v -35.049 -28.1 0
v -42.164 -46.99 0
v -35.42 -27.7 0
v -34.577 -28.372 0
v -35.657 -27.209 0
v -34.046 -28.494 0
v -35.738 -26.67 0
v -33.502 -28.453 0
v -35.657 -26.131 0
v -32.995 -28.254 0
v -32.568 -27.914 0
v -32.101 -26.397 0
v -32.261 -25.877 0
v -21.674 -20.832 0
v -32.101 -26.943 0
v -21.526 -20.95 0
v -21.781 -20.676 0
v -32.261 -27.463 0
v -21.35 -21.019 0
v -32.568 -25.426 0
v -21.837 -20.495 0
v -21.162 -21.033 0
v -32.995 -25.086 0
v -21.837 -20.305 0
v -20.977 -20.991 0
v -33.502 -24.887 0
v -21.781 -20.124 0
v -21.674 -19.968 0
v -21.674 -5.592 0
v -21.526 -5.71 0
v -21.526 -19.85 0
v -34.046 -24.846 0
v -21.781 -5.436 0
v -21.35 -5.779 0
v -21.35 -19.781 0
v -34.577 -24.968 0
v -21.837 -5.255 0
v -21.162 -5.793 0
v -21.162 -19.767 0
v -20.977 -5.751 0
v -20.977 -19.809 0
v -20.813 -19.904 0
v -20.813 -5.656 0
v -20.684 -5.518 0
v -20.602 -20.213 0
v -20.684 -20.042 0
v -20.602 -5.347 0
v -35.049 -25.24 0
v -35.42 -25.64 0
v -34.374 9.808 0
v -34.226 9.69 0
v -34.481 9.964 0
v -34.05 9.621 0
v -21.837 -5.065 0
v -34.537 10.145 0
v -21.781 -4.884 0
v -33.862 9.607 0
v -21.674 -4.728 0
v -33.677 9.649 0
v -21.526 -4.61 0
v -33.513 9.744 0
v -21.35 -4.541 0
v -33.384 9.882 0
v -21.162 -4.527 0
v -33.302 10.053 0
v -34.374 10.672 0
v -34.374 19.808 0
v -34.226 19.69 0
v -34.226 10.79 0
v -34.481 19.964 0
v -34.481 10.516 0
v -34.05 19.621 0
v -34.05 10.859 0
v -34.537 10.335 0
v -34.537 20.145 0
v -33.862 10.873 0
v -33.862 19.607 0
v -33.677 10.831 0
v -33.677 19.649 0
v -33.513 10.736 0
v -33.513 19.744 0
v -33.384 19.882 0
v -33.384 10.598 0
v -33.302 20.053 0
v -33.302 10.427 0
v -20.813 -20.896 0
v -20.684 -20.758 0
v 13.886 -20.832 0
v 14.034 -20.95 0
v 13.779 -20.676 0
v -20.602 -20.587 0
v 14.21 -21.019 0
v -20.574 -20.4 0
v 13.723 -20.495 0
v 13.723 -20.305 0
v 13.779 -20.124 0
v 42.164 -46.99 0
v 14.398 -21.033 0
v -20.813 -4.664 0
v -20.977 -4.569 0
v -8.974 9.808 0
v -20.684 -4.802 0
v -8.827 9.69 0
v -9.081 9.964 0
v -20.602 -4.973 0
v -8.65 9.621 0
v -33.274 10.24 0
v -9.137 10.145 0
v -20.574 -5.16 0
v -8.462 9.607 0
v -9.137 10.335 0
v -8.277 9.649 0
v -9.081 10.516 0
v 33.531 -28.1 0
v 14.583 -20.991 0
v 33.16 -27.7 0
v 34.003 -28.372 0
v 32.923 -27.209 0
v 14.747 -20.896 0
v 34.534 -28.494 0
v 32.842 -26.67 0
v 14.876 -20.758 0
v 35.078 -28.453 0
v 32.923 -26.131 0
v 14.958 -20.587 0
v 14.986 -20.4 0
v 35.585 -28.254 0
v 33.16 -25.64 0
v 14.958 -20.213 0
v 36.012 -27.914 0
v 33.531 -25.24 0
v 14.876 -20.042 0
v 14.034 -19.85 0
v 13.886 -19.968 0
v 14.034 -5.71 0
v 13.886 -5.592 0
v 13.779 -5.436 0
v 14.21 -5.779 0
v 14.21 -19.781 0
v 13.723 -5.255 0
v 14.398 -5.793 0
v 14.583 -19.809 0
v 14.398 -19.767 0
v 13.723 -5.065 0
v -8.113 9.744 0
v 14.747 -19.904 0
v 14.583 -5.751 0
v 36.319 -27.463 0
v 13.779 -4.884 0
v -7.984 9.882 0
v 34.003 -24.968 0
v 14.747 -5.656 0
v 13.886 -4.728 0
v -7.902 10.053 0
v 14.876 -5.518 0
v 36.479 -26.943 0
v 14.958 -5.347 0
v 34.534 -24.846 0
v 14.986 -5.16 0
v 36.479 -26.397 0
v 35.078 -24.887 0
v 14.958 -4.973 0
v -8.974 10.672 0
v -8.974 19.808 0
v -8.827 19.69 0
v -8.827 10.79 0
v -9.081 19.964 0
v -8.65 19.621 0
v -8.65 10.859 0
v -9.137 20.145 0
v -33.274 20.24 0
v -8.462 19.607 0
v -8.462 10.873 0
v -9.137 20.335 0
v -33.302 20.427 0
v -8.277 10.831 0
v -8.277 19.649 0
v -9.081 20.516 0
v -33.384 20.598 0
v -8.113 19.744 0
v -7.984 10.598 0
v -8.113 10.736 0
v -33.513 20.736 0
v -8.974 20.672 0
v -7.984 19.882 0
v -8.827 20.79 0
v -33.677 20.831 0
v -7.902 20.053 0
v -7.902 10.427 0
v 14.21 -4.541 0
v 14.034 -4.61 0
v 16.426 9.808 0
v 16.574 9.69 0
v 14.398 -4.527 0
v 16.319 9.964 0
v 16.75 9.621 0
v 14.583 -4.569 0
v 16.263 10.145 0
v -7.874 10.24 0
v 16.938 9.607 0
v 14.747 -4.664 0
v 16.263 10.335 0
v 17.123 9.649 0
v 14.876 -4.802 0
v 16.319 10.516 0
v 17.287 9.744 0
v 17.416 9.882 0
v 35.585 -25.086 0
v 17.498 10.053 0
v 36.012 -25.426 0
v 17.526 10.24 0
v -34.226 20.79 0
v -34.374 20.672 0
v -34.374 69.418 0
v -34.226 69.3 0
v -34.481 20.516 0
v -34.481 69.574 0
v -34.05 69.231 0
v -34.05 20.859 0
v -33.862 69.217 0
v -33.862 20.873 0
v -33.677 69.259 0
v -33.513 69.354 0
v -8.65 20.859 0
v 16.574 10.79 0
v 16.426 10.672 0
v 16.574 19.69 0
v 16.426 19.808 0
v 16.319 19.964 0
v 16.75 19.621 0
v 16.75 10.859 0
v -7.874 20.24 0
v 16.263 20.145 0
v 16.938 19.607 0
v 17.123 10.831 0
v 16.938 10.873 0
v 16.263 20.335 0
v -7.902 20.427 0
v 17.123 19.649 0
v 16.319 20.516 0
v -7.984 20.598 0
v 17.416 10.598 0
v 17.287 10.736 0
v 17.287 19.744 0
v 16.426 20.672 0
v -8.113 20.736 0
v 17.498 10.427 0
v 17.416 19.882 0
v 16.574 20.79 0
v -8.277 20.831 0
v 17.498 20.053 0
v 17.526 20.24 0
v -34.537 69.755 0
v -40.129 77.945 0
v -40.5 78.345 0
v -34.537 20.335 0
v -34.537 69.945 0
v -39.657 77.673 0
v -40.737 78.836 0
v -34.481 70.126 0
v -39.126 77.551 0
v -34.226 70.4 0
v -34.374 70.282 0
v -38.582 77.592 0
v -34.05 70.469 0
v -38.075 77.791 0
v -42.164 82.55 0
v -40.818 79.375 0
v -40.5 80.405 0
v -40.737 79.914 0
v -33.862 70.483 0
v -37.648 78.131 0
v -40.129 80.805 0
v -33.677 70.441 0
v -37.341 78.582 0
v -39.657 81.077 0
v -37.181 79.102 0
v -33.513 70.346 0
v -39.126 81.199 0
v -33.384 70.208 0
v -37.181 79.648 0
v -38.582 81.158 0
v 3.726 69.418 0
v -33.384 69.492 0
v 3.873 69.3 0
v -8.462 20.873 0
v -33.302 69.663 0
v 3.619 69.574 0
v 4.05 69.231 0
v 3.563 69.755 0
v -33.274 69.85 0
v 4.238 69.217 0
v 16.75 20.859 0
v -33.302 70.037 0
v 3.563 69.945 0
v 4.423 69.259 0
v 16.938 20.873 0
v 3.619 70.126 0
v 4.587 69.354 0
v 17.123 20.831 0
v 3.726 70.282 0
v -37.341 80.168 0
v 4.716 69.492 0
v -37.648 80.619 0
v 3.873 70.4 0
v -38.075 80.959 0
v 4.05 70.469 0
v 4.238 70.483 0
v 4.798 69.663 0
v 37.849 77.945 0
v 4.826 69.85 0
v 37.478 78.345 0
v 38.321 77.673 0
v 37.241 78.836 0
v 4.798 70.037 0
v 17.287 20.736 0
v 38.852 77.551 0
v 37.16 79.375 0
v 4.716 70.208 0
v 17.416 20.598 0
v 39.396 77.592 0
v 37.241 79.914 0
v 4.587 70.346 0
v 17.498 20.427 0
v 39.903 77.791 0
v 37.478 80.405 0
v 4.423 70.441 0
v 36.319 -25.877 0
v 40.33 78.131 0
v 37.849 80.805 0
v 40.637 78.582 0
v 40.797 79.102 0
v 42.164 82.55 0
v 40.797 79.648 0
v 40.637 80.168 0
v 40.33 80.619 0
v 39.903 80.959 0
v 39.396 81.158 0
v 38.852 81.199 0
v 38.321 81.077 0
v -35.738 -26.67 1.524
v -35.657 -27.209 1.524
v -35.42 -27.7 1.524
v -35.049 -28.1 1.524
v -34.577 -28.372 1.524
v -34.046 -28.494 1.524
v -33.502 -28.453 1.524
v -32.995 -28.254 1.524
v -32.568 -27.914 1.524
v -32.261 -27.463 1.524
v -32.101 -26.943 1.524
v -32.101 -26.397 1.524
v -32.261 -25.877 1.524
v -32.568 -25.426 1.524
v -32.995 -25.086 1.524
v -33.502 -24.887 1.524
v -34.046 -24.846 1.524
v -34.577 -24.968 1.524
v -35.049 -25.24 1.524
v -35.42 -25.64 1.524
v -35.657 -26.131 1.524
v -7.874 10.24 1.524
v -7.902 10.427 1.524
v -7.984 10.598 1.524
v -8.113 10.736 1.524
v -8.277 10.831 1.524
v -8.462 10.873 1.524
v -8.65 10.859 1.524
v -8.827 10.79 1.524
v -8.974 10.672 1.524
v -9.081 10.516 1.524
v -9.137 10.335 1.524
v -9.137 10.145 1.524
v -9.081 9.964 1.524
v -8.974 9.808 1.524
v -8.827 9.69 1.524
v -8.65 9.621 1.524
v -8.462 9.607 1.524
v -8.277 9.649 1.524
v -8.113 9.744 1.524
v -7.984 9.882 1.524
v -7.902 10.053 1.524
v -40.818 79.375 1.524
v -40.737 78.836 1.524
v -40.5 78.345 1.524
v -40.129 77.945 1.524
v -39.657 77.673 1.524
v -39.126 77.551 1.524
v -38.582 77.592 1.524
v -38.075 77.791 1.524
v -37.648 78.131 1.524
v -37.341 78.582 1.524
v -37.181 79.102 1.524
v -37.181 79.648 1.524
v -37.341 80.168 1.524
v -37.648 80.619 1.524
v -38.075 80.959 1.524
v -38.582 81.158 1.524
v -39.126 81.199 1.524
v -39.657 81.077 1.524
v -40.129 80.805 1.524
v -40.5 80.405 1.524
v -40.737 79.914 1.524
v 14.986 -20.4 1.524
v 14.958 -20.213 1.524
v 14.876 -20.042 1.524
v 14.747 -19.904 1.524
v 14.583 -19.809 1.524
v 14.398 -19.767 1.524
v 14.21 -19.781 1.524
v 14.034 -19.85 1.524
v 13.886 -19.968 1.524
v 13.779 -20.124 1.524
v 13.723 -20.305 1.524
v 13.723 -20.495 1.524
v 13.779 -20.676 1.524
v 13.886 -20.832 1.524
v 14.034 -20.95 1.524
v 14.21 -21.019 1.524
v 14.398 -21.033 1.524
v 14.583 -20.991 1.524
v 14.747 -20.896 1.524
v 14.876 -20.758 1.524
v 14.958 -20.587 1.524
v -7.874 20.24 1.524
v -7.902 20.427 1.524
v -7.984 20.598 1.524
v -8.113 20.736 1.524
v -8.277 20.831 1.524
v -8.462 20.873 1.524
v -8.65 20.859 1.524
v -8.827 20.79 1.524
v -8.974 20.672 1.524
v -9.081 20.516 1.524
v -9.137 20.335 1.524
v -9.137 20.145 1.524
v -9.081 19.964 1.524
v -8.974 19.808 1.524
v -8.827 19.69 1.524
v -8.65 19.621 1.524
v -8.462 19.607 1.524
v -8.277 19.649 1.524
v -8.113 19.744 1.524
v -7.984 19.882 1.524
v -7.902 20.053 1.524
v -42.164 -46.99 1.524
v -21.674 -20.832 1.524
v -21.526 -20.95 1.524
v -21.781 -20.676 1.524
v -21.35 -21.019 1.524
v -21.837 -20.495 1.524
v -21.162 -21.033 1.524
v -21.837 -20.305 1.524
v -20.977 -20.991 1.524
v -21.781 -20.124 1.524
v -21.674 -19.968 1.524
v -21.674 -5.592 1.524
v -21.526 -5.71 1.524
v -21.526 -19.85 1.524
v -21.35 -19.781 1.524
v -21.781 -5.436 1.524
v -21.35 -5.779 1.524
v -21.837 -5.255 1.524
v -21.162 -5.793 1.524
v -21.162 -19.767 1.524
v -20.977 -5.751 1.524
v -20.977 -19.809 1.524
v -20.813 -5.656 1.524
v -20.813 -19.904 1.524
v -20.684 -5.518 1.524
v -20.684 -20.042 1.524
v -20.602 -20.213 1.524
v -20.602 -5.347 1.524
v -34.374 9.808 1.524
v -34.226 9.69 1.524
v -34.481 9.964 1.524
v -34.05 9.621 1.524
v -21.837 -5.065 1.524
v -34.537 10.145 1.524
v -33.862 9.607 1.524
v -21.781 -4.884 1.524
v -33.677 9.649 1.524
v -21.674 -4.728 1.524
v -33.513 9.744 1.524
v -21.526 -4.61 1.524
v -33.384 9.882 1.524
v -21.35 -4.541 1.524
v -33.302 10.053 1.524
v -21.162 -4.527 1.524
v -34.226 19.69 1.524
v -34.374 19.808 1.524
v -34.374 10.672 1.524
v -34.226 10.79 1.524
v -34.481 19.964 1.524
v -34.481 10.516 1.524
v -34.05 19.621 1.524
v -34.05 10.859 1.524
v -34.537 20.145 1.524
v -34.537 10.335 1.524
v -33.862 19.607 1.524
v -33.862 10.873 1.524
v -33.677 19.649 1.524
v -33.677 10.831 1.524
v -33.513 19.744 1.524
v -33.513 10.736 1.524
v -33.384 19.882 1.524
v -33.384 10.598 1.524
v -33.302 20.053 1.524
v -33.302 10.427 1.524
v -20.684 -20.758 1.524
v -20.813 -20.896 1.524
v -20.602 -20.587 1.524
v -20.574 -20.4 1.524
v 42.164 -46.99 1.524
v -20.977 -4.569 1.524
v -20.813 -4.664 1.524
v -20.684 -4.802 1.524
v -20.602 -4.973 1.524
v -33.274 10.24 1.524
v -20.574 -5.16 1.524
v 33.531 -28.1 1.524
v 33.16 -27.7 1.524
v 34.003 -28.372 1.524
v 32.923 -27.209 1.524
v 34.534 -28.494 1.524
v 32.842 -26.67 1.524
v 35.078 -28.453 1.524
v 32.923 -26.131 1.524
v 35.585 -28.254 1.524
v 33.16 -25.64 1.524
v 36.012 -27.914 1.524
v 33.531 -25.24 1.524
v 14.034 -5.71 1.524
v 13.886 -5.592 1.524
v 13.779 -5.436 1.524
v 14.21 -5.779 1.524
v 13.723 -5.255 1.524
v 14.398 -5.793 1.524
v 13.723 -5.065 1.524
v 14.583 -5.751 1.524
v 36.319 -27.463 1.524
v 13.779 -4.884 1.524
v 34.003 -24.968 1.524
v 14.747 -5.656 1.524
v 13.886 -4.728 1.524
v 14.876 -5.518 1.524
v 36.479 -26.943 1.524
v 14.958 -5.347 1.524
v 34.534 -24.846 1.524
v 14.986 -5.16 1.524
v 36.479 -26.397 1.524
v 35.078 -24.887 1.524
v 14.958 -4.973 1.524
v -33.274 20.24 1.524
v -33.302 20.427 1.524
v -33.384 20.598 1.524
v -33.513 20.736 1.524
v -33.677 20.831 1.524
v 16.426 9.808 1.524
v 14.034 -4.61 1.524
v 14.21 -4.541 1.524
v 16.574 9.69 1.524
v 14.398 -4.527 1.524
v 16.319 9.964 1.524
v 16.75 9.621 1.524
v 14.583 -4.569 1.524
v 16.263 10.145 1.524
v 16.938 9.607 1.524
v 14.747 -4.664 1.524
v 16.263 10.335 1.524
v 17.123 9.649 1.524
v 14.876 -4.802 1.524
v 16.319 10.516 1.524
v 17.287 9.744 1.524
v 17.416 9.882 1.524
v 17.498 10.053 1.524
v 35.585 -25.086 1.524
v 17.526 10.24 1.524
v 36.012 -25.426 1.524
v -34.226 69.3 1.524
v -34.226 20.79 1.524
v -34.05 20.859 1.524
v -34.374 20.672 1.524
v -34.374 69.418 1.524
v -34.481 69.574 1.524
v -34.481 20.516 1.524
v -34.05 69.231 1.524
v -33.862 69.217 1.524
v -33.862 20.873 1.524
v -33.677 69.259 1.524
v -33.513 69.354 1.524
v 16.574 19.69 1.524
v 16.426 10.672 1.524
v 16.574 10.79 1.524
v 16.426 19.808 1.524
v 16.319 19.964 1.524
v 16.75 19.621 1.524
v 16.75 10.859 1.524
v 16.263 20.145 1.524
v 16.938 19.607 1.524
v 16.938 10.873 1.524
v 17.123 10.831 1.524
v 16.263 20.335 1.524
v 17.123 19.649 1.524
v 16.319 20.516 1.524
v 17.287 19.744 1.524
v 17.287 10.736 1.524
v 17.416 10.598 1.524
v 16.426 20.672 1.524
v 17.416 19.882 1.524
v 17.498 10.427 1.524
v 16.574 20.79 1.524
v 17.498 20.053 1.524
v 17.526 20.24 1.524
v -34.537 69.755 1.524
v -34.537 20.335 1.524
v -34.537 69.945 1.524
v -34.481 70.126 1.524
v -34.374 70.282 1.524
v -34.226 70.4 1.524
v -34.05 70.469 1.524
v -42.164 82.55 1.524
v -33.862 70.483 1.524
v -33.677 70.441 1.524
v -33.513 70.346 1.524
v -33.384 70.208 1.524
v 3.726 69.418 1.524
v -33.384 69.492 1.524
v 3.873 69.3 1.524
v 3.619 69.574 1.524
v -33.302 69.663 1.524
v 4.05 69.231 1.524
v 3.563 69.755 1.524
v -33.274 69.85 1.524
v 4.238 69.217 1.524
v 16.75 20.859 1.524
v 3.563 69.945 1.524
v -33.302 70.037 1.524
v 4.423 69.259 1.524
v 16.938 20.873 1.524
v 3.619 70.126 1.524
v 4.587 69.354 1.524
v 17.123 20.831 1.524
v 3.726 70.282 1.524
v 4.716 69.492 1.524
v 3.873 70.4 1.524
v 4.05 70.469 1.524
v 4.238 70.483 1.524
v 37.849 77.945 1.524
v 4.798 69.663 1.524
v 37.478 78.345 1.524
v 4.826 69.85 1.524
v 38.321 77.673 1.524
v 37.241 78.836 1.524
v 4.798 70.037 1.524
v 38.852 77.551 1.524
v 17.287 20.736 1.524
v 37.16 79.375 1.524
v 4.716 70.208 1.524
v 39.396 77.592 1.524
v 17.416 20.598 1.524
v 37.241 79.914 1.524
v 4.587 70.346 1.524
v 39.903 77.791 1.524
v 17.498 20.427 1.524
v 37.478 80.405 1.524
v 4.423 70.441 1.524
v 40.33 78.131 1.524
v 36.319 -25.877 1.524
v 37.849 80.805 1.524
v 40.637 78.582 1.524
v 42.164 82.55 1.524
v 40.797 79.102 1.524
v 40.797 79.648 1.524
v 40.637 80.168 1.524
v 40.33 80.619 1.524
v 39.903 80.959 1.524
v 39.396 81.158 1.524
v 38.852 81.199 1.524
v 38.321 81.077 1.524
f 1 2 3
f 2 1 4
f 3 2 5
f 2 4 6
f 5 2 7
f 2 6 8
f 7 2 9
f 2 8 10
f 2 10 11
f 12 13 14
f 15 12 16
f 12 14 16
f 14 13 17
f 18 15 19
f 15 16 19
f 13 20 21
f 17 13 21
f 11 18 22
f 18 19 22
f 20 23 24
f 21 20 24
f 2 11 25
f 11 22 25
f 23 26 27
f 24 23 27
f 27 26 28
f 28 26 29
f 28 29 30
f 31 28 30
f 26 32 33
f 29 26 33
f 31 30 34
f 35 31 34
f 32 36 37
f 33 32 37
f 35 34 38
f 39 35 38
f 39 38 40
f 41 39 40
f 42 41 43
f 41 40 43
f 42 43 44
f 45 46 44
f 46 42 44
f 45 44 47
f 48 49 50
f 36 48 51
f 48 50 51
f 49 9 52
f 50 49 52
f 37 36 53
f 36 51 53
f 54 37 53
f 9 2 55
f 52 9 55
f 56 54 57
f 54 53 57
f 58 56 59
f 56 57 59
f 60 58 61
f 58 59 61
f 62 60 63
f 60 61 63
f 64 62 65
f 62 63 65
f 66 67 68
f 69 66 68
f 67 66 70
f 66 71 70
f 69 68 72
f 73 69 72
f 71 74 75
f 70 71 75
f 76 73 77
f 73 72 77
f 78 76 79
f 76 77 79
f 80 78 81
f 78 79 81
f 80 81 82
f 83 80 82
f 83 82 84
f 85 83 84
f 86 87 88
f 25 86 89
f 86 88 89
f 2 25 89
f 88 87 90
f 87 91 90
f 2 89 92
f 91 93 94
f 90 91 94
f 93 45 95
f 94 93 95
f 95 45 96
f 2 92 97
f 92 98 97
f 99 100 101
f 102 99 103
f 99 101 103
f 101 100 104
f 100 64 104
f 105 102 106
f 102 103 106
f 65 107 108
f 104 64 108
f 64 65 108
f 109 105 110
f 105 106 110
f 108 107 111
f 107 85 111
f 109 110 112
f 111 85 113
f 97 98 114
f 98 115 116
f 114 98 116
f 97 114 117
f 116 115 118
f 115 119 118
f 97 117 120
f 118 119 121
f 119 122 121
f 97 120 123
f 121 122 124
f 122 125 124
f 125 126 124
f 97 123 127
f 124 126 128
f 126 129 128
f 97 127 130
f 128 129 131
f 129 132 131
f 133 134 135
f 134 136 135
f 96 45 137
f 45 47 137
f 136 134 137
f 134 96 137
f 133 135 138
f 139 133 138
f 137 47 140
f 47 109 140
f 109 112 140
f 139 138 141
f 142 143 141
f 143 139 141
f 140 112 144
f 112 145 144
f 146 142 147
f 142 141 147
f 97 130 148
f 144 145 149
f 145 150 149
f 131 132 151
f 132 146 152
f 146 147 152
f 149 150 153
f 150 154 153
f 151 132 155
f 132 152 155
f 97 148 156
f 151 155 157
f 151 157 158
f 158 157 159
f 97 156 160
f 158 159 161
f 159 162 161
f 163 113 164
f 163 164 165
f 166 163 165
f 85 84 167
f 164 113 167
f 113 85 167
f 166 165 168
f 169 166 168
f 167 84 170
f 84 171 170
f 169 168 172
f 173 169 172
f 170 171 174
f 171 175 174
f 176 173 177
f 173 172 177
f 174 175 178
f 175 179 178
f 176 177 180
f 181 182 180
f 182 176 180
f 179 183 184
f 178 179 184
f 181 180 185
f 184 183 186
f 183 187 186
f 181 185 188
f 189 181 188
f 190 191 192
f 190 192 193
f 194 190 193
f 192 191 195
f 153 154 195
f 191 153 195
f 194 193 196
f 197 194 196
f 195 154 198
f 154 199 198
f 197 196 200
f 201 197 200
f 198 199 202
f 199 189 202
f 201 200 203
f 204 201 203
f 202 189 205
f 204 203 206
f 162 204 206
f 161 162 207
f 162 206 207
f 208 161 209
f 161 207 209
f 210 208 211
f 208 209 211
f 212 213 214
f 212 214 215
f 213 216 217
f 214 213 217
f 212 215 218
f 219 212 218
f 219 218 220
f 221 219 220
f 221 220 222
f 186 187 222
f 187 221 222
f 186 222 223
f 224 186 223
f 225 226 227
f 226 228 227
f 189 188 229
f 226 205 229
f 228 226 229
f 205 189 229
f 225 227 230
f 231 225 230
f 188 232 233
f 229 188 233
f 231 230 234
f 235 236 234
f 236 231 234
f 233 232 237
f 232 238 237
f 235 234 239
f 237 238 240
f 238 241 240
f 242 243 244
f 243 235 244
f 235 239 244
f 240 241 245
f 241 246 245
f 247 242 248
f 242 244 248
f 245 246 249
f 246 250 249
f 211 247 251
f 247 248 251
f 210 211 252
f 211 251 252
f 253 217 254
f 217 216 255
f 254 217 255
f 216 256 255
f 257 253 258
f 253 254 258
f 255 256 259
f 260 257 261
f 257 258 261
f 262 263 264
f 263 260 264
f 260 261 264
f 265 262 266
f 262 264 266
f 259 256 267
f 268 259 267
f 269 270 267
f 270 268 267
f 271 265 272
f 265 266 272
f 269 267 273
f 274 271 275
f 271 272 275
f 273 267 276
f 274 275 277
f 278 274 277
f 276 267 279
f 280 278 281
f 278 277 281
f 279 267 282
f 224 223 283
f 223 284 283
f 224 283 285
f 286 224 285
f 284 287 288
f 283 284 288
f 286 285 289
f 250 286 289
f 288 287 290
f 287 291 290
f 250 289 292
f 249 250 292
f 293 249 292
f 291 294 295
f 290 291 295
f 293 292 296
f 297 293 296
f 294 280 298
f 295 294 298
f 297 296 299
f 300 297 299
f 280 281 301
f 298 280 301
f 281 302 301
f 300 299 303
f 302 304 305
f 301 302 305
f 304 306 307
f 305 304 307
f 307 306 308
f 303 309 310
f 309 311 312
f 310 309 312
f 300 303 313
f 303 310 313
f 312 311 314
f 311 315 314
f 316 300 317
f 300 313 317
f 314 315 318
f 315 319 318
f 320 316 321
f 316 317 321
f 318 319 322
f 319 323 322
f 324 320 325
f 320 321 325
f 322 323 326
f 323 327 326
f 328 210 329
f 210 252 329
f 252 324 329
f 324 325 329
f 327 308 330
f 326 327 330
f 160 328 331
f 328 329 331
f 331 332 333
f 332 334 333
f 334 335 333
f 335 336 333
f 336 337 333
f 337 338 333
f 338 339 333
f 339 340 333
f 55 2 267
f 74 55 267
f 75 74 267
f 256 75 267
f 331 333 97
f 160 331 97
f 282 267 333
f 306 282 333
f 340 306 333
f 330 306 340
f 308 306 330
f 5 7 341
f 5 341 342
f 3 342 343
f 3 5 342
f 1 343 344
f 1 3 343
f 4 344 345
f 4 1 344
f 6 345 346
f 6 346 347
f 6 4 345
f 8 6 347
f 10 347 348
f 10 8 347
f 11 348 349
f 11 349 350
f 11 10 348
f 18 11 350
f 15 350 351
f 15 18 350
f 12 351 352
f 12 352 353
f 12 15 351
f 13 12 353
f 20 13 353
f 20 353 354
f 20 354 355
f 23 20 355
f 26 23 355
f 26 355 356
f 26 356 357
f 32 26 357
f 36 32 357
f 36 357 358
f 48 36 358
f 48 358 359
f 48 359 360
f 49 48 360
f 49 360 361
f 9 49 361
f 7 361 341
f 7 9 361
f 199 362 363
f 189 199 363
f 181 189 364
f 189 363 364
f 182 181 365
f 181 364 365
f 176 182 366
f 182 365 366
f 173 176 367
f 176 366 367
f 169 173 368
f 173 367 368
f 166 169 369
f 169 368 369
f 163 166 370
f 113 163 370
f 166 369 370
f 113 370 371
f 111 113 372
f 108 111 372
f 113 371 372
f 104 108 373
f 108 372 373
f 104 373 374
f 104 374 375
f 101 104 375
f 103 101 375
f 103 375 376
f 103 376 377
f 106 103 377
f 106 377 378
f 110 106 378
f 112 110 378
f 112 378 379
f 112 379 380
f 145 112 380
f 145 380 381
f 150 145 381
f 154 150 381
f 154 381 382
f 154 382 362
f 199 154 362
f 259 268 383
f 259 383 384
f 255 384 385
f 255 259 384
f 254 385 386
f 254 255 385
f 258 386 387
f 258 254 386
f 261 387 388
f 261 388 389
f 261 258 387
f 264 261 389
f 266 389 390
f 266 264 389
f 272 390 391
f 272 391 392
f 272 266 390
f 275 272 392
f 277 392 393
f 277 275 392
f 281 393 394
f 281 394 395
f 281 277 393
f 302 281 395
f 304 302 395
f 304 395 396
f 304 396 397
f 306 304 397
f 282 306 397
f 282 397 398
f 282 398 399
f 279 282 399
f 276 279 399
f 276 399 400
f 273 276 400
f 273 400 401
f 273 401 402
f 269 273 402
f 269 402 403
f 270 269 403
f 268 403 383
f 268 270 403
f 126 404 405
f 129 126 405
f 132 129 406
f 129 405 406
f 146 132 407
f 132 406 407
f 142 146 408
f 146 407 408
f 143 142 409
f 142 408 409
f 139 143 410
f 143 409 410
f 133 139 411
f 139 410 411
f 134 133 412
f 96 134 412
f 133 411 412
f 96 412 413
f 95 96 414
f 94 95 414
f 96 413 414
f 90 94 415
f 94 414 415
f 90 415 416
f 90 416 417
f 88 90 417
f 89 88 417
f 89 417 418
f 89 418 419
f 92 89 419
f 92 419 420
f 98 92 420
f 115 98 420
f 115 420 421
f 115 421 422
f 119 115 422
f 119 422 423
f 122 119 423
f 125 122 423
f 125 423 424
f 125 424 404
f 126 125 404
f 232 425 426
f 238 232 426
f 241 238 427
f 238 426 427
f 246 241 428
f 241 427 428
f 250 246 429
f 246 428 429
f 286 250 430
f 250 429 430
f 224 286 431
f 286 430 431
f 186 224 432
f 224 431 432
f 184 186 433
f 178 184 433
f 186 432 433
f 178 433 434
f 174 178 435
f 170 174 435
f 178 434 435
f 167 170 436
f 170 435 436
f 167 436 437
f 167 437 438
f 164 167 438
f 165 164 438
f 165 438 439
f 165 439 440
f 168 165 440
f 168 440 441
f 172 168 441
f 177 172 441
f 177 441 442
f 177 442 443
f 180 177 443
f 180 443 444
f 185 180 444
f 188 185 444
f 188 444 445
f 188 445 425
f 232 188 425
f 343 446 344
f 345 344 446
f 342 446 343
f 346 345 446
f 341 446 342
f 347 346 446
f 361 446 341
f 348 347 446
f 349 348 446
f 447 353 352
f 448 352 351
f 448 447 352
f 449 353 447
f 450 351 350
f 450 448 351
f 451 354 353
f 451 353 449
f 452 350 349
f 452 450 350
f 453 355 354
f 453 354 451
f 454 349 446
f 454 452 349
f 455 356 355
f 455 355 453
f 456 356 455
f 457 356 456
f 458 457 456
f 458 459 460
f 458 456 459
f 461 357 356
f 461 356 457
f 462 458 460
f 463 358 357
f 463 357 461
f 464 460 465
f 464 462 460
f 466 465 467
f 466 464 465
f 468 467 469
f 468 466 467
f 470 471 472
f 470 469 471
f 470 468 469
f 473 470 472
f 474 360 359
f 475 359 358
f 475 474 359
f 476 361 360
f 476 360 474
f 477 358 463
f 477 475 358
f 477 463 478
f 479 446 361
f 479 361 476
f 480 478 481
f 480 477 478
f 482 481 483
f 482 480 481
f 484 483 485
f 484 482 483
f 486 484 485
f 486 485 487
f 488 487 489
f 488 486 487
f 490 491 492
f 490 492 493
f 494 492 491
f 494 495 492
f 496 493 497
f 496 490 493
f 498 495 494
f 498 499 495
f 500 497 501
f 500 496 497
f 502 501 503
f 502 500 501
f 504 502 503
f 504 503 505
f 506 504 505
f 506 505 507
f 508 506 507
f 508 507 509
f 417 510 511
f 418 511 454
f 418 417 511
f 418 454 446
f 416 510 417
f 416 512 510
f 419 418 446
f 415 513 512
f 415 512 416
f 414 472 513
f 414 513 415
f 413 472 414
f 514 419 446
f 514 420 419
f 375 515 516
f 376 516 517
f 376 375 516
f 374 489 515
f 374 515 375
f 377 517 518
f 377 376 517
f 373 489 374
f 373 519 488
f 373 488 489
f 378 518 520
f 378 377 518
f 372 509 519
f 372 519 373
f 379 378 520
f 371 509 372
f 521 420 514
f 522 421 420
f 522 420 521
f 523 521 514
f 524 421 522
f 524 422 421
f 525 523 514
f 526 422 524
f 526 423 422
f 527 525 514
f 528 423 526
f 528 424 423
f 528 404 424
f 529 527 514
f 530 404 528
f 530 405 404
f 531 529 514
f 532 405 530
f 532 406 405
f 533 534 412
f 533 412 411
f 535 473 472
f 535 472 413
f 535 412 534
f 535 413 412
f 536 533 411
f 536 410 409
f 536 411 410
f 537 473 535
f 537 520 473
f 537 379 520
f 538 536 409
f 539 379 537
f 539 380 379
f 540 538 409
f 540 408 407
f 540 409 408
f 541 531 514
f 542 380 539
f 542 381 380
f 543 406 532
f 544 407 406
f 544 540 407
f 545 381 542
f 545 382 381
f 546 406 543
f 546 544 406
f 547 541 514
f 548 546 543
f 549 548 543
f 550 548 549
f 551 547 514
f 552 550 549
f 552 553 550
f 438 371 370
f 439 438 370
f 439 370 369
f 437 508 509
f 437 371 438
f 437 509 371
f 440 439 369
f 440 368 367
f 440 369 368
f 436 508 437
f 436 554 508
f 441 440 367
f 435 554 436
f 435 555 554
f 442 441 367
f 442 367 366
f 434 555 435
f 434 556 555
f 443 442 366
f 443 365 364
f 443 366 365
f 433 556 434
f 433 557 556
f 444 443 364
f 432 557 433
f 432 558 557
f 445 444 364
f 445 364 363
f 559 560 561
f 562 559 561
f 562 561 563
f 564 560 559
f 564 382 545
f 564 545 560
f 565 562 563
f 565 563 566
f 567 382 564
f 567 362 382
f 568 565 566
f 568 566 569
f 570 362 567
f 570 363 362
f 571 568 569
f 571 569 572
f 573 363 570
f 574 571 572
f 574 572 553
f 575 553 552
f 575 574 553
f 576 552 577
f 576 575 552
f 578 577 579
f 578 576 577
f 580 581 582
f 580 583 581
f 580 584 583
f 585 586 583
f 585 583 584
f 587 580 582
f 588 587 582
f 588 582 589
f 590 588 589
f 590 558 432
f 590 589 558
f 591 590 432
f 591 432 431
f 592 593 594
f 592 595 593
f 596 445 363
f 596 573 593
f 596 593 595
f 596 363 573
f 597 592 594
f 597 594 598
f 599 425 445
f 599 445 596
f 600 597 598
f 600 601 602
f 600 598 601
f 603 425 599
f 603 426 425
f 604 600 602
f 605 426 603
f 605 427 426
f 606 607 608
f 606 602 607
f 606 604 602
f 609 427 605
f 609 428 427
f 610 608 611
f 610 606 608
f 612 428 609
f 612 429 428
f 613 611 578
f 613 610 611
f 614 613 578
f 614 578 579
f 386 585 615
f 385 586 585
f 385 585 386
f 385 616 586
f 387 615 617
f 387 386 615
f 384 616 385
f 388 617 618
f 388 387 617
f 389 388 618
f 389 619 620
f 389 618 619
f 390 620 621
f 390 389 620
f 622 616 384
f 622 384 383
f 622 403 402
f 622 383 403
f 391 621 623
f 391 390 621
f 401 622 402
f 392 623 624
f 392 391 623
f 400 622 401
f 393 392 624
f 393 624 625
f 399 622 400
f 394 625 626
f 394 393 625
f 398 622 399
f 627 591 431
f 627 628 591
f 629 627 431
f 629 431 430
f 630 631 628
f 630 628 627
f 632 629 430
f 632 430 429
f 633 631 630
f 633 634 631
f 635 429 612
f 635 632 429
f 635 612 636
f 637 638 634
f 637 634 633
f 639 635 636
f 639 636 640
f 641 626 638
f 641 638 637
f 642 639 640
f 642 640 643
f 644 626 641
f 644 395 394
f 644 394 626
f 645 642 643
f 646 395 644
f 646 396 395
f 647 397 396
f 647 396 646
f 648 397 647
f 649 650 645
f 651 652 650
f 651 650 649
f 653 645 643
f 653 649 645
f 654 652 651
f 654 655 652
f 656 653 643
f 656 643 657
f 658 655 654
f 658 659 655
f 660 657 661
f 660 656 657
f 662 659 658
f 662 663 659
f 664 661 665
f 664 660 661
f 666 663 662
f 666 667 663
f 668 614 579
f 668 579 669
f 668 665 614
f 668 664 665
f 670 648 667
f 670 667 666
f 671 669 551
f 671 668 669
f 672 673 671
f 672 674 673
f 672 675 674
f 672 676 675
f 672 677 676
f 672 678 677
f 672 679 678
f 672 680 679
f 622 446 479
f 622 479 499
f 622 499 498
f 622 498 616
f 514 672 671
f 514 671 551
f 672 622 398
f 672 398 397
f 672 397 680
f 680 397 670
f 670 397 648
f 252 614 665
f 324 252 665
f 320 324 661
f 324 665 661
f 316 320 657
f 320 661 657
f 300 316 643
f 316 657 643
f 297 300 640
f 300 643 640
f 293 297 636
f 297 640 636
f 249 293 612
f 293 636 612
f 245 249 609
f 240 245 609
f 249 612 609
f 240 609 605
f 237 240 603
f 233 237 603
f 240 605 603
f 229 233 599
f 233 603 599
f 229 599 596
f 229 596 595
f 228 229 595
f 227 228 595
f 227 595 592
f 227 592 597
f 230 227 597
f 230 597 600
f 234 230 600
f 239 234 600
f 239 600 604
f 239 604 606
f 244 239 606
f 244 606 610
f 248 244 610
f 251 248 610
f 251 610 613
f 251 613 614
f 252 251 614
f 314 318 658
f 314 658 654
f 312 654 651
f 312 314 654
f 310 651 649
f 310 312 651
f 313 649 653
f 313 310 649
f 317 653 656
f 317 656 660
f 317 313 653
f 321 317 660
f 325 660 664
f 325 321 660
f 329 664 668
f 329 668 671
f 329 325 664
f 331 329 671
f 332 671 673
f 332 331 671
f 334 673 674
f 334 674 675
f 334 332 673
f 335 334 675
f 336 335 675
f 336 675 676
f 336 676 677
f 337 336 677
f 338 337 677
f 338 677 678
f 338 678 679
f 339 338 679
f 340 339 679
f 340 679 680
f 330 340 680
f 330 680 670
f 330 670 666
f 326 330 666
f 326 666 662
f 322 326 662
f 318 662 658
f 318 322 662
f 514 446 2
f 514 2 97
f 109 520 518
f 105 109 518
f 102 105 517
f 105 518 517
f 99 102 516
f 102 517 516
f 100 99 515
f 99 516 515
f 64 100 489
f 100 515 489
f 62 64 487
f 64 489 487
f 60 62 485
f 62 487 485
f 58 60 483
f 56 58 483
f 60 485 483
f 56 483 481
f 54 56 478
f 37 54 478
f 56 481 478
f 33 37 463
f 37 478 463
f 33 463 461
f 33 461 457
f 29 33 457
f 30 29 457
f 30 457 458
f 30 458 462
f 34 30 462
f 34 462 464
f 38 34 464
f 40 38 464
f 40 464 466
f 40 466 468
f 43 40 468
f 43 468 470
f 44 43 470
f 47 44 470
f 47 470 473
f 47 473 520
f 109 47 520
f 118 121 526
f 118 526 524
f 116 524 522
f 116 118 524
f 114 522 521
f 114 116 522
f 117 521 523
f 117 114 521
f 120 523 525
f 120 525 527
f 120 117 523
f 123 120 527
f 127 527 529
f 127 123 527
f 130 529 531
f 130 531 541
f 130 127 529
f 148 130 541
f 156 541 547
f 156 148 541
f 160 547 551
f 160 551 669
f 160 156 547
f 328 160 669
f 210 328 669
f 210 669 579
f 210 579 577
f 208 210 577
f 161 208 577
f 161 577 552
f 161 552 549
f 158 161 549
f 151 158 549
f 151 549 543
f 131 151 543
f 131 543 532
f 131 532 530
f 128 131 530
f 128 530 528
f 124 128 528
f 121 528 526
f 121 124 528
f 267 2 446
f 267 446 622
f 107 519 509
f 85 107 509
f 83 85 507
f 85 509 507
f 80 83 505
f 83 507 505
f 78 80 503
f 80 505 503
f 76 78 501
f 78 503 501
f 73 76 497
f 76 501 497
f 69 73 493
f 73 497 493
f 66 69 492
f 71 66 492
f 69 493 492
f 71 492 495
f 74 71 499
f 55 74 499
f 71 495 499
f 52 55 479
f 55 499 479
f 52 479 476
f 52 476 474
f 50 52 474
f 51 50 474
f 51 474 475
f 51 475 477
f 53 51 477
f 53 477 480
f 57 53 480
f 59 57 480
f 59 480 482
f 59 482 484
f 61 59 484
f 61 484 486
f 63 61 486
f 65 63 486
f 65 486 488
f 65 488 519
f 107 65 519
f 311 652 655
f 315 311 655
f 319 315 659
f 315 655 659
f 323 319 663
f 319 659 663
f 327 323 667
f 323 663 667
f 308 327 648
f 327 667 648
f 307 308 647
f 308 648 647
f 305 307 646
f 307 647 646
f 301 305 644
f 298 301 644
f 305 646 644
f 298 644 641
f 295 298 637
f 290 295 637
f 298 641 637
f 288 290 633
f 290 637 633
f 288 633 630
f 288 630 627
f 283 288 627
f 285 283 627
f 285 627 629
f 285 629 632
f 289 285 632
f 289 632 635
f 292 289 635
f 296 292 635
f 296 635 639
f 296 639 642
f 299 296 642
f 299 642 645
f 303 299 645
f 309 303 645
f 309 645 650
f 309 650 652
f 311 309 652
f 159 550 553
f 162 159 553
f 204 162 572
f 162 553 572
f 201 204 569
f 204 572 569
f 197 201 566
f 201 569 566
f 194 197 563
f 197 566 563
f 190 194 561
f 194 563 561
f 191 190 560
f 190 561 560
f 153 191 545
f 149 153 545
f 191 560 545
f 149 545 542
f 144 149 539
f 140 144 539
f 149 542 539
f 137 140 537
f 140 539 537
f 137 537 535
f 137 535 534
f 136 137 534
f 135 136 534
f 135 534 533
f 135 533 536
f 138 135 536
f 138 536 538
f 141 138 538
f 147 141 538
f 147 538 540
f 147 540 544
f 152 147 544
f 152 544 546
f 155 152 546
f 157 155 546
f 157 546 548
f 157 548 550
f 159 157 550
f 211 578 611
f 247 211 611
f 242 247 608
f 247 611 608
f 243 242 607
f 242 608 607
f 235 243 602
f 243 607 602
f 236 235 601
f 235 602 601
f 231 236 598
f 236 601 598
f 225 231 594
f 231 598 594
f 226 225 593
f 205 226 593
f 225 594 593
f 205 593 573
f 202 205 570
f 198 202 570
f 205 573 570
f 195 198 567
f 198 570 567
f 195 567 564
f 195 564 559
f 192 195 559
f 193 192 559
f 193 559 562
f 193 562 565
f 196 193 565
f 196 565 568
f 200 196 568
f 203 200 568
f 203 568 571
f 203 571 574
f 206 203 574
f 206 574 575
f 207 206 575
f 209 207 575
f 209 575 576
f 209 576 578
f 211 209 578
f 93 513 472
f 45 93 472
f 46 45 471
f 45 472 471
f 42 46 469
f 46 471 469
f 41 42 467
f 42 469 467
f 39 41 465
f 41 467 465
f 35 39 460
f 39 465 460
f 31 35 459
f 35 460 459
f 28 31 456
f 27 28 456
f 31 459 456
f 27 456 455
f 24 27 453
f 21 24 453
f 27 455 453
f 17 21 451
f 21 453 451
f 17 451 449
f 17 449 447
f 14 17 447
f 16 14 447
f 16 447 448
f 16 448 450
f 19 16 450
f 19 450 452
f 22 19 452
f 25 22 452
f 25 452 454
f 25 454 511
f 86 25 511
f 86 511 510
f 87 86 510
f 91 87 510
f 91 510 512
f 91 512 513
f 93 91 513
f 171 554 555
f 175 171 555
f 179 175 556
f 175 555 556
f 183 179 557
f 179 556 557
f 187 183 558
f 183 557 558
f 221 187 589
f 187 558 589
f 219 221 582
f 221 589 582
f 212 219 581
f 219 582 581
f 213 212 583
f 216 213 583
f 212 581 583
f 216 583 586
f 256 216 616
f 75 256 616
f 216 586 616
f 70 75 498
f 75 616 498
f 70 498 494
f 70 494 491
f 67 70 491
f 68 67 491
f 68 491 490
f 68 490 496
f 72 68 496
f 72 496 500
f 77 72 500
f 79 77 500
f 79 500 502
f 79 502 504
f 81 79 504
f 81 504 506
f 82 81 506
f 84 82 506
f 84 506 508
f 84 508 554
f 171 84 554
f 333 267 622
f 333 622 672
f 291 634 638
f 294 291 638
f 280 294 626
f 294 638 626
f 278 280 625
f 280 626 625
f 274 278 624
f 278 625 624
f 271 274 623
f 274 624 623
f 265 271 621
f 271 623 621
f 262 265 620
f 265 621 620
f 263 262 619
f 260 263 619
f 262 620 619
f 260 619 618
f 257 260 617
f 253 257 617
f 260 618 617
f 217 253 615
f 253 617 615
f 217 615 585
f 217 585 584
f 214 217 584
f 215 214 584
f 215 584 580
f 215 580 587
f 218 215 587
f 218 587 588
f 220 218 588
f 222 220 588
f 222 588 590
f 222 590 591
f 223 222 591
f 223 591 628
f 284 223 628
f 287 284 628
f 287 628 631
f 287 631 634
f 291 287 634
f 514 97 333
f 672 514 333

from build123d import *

# Parameters (mm, degrees)
SKETCH1_W                  = 84.328
SKETCH1_H                  = 165.1
SKETCH1_R                  = 1.8288
EXTRUDE1_DEPTH             = 1.524
SKETCH3_R                  = 0.635
LCD_HOLES_DEPTH            = 93.707216397
SKETCH4_R                  = 0.635
POT_HOLES_DEPTH            = 93.707216397
SKETCH5_R                  = 0.635
ARDUINO_HEADER_HOLES_DEPTH = 93.707216397
SKETCH6_W                  = 84.328
SKETCH6_H                  = 35.56
CUT_EXTRUDE1_DEPTH         = 93.707216397


with BuildPart() as part:
    # Sketch1 → Extrude1 (new body)
    with BuildSketch(Plane.XY):
        Rectangle(SKETCH1_W, SKETCH1_H)
        with Locations(Location((-38.989, 79.375, 0), (0, 0, 180))):
            Circle(SKETCH1_R, mode=Mode.SUBTRACT)
        with Locations(Location((38.989, 79.375, 0), (0, 0, 180))):
            Circle(SKETCH1_R, mode=Mode.SUBTRACT)
        with Locations(Location((-38.989, -79.375, 0), (0, 0, 180))):
            Circle(SKETCH1_R, mode=Mode.SUBTRACT)
        with Locations(Location((38.989, -79.375, 0), (0, 0, 180))):
            Circle(SKETCH1_R, mode=Mode.SUBTRACT)
        with Locations(Location((-33.909, -26.67, 0), (0, 0, 180))):
            Circle(SKETCH1_R, mode=Mode.SUBTRACT)
        with Locations(Location((34.671, -26.67, 0), (0, 0, 180))):
            Circle(SKETCH1_R, mode=Mode.SUBTRACT)
    extrude(amount=EXTRUDE1_DEPTH)

    # Sketch3 → LCD holes (cut, through all)
    with BuildSketch(Plane.XY.offset(1.524)):
        with Locations((-33.909, 69.85)):
            Circle(SKETCH3_R)
        with Locations((4.191, 69.85)):
            Circle(SKETCH3_R)
    extrude(amount=-LCD_HOLES_DEPTH, mode=Mode.SUBTRACT)

    # Sketch4 → Pot Holes (cut, through all)
    with BuildSketch(Plane.XY.offset(1.524)):
        with Locations((-33.909, 20.24)):
            Circle(SKETCH4_R)
        with Locations((-33.909, 10.24)):
            Circle(SKETCH4_R)
        with Locations((-8.509, 10.24)):
            Circle(SKETCH4_R)
        with Locations((-8.509, 20.24)):
            Circle(SKETCH4_R)
        with Locations((16.891, 10.24)):
            Circle(SKETCH4_R)
        with Locations((16.891, 20.24)):
            Circle(SKETCH4_R)
    extrude(amount=-POT_HOLES_DEPTH, mode=Mode.SUBTRACT)

    # Sketch5 → Arduino Header holes (cut, through all)
    with BuildSketch(Plane.XY.offset(1.524)):
        with Locations((-21.209, -5.16)):
            Circle(SKETCH5_R)
        with Locations((14.351, -5.16)):
            Circle(SKETCH5_R)
        with Locations((-21.209, -20.4)):
            Circle(SKETCH5_R)
        with Locations((14.351, -20.4)):
            Circle(SKETCH5_R)
    extrude(amount=-ARDUINO_HEADER_HOLES_DEPTH, mode=Mode.SUBTRACT)

    # Sketch6 → Cut-Extrude1 (cut, through all)
    with BuildSketch(Plane.XY.offset(1.524)):
        with Locations((0, -64.77)):
            Rectangle(SKETCH6_W, SKETCH6_H)
    extrude(amount=-CUT_EXTRUDE1_DEPTH, mode=Mode.SUBTRACT)


solid = part.part
